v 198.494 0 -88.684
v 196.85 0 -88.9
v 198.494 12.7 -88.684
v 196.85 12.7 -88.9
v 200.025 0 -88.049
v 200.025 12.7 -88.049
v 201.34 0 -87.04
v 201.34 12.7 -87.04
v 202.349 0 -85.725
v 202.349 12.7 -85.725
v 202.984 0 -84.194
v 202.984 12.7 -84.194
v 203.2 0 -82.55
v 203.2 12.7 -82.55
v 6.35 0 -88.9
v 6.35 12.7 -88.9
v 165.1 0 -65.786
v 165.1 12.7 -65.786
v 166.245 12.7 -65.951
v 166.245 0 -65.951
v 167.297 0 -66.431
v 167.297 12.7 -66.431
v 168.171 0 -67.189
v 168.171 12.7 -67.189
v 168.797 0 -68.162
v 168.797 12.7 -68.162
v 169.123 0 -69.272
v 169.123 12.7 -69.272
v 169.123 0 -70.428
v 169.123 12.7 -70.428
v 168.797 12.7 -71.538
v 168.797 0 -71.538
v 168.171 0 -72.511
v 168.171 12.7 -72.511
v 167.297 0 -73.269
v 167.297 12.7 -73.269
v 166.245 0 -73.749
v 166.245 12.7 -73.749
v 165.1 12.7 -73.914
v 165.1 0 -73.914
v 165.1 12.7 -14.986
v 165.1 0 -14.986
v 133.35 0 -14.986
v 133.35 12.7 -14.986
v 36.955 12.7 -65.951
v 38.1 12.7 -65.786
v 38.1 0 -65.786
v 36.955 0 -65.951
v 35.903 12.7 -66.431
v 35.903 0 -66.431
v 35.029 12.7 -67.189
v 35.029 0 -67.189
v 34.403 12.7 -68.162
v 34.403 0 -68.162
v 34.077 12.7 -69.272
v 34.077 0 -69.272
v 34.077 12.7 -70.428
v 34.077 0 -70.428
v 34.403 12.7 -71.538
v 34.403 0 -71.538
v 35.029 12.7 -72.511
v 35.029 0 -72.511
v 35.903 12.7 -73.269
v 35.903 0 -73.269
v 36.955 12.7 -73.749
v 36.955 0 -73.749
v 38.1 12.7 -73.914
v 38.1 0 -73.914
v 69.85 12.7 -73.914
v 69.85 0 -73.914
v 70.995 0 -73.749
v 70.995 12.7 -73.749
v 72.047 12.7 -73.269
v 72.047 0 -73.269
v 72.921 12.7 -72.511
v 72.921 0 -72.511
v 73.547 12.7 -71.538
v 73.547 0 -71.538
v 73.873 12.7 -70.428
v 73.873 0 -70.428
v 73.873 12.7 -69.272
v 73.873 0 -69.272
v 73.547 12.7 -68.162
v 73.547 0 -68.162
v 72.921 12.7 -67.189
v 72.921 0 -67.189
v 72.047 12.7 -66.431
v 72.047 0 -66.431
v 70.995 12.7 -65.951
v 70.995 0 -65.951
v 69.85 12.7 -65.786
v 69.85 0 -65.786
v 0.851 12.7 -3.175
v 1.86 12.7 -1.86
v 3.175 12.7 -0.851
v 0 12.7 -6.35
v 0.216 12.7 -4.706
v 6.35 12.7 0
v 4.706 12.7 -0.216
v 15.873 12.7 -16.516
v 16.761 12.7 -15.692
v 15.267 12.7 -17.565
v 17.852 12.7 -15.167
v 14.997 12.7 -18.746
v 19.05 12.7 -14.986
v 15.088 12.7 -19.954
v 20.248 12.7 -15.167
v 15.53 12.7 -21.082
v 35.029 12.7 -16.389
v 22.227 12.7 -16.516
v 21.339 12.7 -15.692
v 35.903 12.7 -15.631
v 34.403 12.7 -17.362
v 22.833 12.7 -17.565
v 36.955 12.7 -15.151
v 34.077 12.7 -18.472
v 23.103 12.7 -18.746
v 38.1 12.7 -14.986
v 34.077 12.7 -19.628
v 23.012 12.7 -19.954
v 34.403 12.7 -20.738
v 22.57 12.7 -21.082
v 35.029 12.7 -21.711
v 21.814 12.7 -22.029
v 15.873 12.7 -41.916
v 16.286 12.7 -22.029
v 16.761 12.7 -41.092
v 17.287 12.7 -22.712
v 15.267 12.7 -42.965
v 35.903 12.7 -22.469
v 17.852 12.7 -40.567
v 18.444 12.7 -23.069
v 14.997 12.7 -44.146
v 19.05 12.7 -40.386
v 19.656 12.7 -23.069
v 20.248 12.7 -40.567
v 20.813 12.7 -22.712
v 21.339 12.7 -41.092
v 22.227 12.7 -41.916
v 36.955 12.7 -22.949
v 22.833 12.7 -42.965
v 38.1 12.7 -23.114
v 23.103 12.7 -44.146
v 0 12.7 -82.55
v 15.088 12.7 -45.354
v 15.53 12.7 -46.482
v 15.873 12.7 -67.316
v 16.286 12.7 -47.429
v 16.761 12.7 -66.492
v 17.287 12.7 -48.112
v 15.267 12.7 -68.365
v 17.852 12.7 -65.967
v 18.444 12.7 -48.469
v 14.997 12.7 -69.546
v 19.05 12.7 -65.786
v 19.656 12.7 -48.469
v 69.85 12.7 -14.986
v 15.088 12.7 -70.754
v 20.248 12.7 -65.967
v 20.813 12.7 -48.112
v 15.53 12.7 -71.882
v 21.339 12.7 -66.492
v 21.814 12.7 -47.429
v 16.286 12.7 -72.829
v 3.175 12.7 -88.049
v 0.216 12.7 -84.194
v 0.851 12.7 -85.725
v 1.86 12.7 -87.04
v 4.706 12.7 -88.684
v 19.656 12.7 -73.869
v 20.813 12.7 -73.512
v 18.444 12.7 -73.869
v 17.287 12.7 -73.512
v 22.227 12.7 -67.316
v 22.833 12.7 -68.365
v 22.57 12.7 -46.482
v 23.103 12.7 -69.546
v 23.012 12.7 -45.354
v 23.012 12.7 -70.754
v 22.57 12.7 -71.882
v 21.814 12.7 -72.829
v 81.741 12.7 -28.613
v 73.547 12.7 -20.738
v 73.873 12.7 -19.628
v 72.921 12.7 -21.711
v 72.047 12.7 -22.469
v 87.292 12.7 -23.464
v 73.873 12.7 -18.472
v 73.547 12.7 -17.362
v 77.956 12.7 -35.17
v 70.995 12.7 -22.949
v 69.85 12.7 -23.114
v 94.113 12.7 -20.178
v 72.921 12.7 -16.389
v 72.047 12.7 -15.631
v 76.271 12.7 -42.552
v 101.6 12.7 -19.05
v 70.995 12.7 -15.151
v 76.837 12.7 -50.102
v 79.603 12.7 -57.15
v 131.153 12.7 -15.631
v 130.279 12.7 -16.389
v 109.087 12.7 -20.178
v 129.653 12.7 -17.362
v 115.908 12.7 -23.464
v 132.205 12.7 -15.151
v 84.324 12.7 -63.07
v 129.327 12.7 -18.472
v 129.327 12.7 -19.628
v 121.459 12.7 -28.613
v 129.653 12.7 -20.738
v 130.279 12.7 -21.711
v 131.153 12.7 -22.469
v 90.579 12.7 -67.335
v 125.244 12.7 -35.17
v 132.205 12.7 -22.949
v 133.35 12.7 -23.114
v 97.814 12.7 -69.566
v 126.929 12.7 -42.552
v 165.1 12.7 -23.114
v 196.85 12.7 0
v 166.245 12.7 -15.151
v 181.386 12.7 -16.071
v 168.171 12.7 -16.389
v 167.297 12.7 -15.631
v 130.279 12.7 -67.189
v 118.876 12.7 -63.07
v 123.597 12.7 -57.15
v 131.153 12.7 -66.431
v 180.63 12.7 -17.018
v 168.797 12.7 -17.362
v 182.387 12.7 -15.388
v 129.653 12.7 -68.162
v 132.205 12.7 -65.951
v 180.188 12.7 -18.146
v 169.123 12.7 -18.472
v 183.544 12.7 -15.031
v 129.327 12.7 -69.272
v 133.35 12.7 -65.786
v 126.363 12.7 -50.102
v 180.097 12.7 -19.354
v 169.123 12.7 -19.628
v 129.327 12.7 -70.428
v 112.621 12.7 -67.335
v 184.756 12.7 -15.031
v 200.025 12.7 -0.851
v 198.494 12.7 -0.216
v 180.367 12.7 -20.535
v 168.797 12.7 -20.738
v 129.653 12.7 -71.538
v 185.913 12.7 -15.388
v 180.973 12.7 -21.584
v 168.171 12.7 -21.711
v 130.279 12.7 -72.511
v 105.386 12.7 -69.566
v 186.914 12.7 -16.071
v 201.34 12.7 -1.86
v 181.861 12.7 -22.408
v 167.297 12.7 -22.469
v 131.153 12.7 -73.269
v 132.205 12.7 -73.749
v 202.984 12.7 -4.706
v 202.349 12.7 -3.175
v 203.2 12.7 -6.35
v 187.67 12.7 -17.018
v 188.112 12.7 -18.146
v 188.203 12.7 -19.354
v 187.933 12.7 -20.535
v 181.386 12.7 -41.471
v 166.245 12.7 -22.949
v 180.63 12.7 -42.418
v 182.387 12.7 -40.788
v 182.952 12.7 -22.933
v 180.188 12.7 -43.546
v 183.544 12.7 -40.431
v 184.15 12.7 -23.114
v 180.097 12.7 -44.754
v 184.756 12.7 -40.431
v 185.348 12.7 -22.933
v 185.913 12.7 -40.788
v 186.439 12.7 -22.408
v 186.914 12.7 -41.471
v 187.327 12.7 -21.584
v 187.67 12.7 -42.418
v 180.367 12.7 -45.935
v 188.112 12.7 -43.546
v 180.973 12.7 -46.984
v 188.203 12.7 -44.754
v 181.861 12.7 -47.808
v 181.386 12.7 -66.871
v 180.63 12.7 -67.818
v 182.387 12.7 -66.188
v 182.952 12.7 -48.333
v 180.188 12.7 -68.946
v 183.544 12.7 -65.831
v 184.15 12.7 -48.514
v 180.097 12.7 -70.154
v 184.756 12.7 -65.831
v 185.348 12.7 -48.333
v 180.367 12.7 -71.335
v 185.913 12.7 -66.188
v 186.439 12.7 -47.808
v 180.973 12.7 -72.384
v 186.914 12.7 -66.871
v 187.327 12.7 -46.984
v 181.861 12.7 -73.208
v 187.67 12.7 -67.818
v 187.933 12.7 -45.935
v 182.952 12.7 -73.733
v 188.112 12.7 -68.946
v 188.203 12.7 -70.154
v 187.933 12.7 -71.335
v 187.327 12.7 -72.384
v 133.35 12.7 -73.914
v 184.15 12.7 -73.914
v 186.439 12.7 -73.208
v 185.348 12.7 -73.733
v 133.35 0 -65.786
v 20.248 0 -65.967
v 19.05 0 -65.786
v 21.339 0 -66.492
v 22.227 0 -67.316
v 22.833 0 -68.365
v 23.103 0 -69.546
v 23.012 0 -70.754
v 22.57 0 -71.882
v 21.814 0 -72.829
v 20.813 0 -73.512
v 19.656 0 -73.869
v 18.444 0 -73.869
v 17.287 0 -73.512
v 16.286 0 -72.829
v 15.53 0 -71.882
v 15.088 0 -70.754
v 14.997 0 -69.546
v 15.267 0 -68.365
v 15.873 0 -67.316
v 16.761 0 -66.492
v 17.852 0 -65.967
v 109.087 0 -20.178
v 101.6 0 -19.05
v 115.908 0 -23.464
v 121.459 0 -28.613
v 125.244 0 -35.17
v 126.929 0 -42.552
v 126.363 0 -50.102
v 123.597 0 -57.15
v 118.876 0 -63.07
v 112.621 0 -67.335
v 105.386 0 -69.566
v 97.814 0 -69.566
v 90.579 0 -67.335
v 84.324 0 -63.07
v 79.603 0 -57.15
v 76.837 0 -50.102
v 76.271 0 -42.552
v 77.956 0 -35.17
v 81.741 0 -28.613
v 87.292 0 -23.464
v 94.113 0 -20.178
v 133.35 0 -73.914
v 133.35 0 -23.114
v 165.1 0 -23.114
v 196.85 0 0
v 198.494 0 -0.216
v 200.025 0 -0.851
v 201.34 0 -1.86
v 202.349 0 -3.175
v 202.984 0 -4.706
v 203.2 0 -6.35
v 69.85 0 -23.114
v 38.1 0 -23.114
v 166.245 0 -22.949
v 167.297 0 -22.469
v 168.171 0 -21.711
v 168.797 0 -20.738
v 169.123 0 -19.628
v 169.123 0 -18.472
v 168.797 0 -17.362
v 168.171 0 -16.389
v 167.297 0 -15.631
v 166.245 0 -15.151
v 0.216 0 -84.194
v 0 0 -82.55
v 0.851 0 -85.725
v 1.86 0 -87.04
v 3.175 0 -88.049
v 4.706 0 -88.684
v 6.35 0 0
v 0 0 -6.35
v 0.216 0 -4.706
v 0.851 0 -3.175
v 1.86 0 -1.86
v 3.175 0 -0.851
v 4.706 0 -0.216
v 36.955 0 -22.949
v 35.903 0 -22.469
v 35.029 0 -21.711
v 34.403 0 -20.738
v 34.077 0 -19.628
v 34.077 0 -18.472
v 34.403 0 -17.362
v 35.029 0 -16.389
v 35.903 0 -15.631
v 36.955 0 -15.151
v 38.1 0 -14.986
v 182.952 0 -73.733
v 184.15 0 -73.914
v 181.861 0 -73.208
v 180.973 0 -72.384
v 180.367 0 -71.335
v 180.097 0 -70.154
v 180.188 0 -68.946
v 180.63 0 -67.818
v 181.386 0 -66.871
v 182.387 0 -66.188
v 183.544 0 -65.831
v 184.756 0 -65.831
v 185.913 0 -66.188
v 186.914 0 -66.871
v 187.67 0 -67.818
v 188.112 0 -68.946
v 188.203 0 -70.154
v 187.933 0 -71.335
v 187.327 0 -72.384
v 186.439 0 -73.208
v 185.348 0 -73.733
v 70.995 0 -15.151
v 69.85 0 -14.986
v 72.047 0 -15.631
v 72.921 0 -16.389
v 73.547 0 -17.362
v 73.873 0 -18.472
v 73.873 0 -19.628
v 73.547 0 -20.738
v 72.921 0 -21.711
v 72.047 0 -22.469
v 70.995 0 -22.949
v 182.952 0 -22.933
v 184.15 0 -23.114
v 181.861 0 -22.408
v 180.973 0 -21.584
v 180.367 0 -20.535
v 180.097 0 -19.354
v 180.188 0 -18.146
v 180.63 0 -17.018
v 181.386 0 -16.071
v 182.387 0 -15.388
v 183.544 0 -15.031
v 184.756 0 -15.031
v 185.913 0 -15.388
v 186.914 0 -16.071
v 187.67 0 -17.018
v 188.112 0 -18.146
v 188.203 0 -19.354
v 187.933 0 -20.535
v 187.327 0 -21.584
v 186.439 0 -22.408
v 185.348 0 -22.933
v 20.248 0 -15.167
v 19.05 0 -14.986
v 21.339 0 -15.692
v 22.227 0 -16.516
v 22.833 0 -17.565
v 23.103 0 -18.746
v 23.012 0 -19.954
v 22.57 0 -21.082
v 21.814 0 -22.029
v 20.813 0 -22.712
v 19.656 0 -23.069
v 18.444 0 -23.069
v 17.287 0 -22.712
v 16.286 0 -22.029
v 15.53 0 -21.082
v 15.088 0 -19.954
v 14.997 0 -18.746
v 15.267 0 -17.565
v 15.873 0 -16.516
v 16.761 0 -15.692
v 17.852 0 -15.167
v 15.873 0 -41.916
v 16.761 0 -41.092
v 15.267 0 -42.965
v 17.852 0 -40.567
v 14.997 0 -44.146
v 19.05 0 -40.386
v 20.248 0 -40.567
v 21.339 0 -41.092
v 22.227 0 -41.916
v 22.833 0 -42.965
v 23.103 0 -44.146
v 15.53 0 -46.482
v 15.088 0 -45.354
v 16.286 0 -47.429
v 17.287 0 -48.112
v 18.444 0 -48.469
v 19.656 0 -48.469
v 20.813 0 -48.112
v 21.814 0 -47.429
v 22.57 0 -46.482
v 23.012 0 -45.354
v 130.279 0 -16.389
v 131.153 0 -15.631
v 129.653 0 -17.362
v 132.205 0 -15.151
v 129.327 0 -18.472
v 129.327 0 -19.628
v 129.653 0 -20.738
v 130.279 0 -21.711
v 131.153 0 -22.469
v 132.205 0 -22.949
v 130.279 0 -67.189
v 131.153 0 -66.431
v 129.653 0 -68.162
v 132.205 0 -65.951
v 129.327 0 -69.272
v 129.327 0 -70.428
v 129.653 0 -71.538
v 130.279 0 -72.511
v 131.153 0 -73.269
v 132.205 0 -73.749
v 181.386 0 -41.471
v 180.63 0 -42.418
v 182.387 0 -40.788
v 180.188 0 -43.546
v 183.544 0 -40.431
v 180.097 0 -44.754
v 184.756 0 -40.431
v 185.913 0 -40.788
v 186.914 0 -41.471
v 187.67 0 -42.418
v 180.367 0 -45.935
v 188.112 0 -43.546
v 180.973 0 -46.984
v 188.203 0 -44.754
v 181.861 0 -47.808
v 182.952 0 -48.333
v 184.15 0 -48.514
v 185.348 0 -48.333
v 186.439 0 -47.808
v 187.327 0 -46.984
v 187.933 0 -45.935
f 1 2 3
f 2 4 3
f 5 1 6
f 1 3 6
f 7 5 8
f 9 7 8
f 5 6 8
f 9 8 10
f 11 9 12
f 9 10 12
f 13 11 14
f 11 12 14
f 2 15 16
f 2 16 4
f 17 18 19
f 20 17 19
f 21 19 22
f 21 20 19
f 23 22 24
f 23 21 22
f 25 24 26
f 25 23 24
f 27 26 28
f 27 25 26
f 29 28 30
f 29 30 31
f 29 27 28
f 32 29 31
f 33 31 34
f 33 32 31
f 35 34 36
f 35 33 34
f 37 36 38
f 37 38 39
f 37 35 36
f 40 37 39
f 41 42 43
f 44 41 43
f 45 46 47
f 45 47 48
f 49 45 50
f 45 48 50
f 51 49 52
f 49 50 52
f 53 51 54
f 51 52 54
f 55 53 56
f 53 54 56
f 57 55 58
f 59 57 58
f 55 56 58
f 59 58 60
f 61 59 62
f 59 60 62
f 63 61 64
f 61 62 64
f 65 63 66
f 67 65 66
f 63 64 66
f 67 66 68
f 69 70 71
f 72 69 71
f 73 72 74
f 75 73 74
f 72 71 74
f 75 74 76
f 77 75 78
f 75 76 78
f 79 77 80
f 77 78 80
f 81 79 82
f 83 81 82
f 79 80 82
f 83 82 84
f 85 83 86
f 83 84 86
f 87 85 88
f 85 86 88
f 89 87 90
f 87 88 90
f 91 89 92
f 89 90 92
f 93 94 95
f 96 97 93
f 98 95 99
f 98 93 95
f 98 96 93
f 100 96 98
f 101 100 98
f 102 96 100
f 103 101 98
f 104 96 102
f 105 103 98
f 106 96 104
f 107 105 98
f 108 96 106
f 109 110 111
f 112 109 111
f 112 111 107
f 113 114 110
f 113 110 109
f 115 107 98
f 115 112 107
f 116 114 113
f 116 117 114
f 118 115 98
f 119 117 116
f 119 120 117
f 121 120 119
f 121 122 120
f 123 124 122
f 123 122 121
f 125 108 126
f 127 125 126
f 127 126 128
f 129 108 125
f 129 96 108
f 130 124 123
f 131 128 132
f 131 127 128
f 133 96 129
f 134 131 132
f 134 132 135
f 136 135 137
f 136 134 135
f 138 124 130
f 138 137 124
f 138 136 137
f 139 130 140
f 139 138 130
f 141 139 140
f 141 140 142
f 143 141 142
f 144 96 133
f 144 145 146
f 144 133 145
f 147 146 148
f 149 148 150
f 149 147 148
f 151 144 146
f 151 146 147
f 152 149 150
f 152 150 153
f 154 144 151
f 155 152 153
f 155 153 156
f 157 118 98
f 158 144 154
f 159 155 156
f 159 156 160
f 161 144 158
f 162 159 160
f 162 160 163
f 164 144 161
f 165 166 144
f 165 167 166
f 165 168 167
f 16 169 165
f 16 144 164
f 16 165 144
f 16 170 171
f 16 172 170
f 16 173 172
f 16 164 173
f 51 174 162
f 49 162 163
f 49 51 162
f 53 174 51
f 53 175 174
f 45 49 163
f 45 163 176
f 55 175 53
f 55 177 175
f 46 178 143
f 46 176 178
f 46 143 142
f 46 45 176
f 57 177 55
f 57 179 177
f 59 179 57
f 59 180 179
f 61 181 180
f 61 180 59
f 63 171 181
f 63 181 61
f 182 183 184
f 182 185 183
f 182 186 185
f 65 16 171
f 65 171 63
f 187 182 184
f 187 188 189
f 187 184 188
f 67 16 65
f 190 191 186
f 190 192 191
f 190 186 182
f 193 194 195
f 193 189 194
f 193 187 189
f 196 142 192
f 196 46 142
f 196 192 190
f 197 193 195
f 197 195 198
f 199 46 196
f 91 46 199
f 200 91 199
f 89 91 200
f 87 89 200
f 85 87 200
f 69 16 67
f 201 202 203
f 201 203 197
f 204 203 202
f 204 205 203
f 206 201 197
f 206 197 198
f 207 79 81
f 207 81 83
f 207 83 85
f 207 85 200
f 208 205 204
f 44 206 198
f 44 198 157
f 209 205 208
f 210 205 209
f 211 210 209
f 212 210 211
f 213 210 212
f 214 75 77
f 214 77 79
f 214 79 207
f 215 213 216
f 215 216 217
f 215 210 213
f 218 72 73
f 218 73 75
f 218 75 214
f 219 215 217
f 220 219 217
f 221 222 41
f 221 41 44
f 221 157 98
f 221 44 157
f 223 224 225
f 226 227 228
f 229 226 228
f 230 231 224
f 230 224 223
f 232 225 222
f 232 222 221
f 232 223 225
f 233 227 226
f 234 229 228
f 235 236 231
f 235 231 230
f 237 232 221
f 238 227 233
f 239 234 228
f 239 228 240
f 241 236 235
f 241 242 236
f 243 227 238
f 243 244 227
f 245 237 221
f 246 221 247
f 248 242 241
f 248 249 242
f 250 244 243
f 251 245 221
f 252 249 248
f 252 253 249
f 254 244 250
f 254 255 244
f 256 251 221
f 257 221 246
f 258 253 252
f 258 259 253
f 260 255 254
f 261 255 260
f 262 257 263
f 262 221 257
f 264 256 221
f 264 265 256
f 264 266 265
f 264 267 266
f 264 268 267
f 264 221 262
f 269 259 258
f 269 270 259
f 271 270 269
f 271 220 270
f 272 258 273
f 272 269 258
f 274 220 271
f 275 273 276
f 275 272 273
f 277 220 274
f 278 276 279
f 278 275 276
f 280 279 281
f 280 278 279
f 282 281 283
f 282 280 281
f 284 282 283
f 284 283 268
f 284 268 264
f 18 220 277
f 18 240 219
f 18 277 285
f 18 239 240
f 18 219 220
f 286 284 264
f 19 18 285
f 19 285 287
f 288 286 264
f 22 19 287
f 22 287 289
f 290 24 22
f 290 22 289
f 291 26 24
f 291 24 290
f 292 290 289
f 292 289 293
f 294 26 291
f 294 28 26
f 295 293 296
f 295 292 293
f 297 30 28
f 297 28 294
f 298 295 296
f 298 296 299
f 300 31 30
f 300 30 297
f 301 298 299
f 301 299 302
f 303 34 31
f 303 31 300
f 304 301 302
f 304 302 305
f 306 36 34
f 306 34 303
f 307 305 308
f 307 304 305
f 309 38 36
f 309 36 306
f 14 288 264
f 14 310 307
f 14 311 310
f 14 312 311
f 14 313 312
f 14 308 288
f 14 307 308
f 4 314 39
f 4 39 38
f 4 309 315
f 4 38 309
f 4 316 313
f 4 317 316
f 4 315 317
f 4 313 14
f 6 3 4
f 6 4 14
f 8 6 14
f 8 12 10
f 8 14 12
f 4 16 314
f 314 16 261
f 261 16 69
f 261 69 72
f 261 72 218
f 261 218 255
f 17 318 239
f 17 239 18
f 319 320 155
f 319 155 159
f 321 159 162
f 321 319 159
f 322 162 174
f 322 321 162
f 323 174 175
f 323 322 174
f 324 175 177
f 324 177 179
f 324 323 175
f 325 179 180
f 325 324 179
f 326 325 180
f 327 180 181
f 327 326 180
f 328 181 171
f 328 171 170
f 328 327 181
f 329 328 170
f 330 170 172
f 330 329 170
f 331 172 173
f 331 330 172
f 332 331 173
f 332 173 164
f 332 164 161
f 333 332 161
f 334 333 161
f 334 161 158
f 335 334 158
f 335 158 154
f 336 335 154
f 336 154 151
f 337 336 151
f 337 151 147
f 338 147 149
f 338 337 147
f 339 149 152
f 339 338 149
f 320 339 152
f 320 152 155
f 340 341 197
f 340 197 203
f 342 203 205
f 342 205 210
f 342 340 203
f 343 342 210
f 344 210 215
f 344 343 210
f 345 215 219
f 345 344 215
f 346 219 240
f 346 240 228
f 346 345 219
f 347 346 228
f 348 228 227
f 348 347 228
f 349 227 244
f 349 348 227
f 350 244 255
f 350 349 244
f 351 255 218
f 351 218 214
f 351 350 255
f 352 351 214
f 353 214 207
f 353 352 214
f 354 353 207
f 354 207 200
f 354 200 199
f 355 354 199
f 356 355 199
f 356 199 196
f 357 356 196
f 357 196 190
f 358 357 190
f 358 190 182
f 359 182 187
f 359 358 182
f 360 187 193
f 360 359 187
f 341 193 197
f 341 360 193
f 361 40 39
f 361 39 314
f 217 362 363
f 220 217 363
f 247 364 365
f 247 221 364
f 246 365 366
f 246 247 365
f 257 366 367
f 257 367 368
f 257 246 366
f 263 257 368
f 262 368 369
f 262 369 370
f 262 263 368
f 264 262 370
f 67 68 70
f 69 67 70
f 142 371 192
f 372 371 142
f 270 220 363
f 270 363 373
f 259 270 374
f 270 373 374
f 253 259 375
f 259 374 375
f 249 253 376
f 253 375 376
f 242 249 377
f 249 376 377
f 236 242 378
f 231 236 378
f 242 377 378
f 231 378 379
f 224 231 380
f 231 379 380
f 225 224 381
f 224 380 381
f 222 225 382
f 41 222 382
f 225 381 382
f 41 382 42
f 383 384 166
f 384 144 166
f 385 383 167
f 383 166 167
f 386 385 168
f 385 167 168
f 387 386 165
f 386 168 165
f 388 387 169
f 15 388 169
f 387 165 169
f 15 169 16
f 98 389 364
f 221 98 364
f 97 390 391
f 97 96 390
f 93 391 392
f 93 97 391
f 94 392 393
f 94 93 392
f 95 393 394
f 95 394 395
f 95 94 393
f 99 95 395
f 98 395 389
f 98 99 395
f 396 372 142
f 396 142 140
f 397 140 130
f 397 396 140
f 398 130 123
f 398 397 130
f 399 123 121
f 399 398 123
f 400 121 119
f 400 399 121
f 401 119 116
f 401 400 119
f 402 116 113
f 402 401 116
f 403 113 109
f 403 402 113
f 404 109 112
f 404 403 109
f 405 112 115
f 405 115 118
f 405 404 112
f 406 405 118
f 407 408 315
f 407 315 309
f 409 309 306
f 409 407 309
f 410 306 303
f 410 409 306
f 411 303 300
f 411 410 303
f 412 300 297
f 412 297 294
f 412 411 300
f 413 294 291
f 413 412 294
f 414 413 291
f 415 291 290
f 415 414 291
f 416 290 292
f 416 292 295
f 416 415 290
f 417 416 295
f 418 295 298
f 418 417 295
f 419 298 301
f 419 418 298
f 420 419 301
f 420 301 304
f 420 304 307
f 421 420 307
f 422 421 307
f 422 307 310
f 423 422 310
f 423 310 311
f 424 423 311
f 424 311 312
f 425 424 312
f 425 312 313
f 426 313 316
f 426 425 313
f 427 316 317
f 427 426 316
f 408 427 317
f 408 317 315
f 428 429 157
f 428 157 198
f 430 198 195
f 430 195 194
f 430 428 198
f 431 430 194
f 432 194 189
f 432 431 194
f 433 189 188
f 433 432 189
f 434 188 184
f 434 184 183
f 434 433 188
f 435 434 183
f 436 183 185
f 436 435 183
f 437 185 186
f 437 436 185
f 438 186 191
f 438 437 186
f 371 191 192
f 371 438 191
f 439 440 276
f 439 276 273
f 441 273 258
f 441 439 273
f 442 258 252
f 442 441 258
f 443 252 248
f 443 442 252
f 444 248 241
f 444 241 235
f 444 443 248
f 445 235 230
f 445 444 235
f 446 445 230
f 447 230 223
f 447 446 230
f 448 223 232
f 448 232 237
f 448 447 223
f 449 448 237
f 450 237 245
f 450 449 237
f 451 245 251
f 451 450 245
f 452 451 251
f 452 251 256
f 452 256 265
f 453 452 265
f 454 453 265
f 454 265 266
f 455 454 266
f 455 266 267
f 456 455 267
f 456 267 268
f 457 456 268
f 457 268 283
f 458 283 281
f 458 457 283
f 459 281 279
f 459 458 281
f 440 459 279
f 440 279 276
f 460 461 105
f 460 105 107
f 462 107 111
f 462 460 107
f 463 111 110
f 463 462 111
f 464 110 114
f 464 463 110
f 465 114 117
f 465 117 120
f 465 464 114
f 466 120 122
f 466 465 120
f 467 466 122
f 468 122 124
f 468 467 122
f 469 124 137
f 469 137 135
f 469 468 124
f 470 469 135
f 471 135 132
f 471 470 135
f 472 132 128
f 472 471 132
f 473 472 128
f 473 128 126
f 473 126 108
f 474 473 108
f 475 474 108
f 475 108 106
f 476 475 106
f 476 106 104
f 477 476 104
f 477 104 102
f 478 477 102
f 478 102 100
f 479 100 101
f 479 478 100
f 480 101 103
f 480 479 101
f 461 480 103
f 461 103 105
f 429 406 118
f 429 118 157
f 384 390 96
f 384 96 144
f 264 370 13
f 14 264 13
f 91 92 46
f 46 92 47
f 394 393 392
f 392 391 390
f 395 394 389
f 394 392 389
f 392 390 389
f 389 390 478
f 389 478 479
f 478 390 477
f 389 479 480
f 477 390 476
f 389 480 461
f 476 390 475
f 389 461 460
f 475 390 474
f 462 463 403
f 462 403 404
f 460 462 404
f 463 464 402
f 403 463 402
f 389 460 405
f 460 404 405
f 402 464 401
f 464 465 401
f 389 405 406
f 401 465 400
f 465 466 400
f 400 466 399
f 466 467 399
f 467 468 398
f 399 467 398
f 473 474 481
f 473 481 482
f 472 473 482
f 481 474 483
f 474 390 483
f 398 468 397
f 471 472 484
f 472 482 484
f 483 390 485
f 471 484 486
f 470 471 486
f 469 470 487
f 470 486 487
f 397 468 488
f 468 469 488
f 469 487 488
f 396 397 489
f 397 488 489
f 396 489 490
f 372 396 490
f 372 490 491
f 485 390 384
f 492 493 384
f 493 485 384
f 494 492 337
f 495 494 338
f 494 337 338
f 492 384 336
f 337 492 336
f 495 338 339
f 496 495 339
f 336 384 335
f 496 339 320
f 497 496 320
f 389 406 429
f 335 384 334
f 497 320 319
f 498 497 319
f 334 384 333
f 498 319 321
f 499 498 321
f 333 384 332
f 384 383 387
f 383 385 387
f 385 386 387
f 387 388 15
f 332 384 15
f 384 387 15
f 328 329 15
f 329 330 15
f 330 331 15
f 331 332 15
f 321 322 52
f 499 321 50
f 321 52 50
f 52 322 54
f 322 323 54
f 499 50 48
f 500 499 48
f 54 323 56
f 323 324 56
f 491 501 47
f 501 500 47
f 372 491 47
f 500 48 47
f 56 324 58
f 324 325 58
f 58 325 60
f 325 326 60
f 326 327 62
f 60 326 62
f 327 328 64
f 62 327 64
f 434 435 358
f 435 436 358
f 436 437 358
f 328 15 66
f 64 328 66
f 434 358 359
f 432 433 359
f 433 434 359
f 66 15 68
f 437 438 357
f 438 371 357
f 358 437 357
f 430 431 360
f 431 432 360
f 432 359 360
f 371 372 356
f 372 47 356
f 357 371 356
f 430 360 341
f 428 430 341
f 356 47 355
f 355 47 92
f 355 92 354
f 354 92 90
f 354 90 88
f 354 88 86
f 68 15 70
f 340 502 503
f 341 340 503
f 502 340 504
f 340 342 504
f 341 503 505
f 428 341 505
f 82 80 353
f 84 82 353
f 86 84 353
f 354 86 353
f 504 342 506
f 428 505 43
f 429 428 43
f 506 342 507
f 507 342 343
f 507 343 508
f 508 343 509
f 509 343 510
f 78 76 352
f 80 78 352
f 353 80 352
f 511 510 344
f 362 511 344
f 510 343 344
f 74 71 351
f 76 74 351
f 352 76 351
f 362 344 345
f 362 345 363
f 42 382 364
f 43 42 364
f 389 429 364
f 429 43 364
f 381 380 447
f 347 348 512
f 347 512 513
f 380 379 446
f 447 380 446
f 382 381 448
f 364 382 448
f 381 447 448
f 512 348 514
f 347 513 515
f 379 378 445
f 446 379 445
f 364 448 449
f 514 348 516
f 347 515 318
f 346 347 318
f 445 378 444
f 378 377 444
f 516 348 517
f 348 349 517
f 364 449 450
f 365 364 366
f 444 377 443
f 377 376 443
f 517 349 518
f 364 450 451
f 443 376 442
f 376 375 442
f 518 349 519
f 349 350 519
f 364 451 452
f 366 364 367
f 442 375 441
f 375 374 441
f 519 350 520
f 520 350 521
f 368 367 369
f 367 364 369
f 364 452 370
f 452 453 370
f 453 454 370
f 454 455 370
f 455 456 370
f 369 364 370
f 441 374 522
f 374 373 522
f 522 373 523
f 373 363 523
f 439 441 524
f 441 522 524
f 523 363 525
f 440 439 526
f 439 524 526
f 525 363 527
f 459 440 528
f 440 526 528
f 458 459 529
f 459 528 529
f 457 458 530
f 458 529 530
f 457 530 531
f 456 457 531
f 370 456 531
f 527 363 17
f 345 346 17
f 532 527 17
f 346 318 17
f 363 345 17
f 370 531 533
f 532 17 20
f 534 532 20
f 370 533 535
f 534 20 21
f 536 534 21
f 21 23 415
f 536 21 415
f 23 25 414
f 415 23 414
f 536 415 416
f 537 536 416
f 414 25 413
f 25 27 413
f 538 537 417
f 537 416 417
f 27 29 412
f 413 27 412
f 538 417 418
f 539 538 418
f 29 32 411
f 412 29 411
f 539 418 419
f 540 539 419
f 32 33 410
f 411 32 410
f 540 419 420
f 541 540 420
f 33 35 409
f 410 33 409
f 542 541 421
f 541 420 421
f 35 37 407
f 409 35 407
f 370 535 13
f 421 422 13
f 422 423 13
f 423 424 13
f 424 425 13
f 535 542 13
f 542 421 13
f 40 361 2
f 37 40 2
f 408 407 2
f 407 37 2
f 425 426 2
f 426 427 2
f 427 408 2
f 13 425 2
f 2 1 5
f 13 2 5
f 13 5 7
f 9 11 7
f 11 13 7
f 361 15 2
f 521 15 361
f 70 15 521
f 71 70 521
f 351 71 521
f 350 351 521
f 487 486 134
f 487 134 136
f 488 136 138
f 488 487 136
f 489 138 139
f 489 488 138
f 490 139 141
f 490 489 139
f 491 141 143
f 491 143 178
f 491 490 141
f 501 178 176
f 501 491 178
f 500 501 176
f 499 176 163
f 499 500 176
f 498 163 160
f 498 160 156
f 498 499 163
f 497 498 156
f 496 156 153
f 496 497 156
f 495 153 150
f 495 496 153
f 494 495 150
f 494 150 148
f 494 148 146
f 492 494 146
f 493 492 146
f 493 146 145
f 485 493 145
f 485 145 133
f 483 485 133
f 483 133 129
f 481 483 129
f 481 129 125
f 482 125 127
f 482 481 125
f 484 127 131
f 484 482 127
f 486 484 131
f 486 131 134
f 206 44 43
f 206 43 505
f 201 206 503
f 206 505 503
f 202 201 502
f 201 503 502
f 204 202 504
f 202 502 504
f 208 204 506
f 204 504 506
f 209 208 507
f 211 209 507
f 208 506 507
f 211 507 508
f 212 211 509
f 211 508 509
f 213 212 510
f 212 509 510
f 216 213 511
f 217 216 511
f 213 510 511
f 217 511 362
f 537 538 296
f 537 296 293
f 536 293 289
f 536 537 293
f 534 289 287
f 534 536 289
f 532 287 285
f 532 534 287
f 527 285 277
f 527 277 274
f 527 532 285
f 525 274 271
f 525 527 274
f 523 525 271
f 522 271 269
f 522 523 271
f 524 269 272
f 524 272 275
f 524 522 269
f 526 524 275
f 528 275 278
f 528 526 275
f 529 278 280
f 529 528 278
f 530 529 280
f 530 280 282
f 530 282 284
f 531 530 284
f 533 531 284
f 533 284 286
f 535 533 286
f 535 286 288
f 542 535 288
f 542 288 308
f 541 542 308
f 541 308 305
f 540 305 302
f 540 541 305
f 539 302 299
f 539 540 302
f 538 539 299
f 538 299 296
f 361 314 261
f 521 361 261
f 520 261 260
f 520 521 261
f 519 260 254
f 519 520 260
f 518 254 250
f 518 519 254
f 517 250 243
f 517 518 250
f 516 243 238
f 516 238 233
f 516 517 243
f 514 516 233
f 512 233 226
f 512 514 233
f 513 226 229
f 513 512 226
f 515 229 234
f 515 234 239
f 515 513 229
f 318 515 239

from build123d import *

# Parameters (mm, degrees)
SKETCH1_W           = 203.2
SKETCH1_H           = 88.9
SKETCH1_R           = 25.4
SKETCH1_R_2         = 4.064
BOSS_EXTRUDE1_DEPTH = 12.7
FILLET1_R           = 6.35


with BuildPart() as part:
    # Sketch1 → Boss-Extrude1 (new body)
    with BuildSketch(Plane(origin=(0, 0, 0), x_dir=(1, 0, 0), z_dir=(0, 1, 0))):
        with Locations((101.6, 44.45)):
            Rectangle(SKETCH1_W, SKETCH1_H)
        with Locations(Location((101.6, 44.45, 0), (0, 0, 270))):
            Circle(SKETCH1_R, mode=Mode.SUBTRACT)
        with Locations(Location((19.05, 19.05, 0), (0, 0, 270))):
            Circle(SKETCH1_R_2, mode=Mode.SUBTRACT)
        with Locations(Location((19.05, 44.45, 0), (0, 0, 270))):
            Circle(SKETCH1_R_2, mode=Mode.SUBTRACT)
        with Locations(Location((19.05, 69.85, 0), (0, 0, 270))):
            Circle(SKETCH1_R_2, mode=Mode.SUBTRACT)
        with Locations(Location((184.15, 69.85, 0), (0, 0, 90))):
            Circle(SKETCH1_R_2, mode=Mode.SUBTRACT)
        with Locations(Location((184.15, 44.45, 0), (0, 0, 90))):
            Circle(SKETCH1_R_2, mode=Mode.SUBTRACT)
        with Locations(Location((184.15, 19.05, 0), (0, 0, 90))):
            Circle(SKETCH1_R_2, mode=Mode.SUBTRACT)
        with BuildLine():
            Line((38.1, 73.914), (69.85, 73.914))
            ThreePointArc((69.85, 73.914), (73.914, 69.85), (69.85, 65.786))
            Line((69.85, 65.786), (38.1, 65.786))
            ThreePointArc((38.1, 65.786), (34.036, 69.85), (38.1, 73.914))
        make_face(mode=Mode.SUBTRACT)
        with BuildLine():
            Line((38.1, 14.986), (69.85, 14.986))
            ThreePointArc((69.85, 14.986), (73.914, 19.05), (69.85, 23.114))
            Line((69.85, 23.114), (38.1, 23.114))
            ThreePointArc((38.1, 23.114), (34.036, 19.05), (38.1, 14.986))
        make_face(mode=Mode.SUBTRACT)
        with BuildLine():
            Line((165.1, 14.986), (133.35, 14.986))
            ThreePointArc((133.35, 14.986), (129.286, 19.05), (133.35, 23.114))
            Line((133.35, 23.114), (165.1, 23.114))
            ThreePointArc((165.1, 23.114), (169.164, 19.05), (165.1, 14.986))
        make_face(mode=Mode.SUBTRACT)
        with BuildLine():
            Line((165.1, 73.914), (133.35, 73.914))
            ThreePointArc((133.35, 73.914), (129.286, 69.85), (133.35, 65.786))
            Line((133.35, 65.786), (165.1, 65.786))
            ThreePointArc((165.1, 65.786), (169.164, 69.85), (165.1, 73.914))
        make_face(mode=Mode.SUBTRACT)
    extrude(amount=BOSS_EXTRUDE1_DEPTH)

    # Fillet1
    fillet1_edges = [part.edges().sort_by_distance(p)[0] for p in [
        (0, 6.35, -88.9),
        (203.2, 6.35, -88.9),
        (203.2, 6.35, 0),
        (0, 6.35, 0),
    ]]
    fillet(fillet1_edges, radius=FILLET1_R)


solid = part.part
